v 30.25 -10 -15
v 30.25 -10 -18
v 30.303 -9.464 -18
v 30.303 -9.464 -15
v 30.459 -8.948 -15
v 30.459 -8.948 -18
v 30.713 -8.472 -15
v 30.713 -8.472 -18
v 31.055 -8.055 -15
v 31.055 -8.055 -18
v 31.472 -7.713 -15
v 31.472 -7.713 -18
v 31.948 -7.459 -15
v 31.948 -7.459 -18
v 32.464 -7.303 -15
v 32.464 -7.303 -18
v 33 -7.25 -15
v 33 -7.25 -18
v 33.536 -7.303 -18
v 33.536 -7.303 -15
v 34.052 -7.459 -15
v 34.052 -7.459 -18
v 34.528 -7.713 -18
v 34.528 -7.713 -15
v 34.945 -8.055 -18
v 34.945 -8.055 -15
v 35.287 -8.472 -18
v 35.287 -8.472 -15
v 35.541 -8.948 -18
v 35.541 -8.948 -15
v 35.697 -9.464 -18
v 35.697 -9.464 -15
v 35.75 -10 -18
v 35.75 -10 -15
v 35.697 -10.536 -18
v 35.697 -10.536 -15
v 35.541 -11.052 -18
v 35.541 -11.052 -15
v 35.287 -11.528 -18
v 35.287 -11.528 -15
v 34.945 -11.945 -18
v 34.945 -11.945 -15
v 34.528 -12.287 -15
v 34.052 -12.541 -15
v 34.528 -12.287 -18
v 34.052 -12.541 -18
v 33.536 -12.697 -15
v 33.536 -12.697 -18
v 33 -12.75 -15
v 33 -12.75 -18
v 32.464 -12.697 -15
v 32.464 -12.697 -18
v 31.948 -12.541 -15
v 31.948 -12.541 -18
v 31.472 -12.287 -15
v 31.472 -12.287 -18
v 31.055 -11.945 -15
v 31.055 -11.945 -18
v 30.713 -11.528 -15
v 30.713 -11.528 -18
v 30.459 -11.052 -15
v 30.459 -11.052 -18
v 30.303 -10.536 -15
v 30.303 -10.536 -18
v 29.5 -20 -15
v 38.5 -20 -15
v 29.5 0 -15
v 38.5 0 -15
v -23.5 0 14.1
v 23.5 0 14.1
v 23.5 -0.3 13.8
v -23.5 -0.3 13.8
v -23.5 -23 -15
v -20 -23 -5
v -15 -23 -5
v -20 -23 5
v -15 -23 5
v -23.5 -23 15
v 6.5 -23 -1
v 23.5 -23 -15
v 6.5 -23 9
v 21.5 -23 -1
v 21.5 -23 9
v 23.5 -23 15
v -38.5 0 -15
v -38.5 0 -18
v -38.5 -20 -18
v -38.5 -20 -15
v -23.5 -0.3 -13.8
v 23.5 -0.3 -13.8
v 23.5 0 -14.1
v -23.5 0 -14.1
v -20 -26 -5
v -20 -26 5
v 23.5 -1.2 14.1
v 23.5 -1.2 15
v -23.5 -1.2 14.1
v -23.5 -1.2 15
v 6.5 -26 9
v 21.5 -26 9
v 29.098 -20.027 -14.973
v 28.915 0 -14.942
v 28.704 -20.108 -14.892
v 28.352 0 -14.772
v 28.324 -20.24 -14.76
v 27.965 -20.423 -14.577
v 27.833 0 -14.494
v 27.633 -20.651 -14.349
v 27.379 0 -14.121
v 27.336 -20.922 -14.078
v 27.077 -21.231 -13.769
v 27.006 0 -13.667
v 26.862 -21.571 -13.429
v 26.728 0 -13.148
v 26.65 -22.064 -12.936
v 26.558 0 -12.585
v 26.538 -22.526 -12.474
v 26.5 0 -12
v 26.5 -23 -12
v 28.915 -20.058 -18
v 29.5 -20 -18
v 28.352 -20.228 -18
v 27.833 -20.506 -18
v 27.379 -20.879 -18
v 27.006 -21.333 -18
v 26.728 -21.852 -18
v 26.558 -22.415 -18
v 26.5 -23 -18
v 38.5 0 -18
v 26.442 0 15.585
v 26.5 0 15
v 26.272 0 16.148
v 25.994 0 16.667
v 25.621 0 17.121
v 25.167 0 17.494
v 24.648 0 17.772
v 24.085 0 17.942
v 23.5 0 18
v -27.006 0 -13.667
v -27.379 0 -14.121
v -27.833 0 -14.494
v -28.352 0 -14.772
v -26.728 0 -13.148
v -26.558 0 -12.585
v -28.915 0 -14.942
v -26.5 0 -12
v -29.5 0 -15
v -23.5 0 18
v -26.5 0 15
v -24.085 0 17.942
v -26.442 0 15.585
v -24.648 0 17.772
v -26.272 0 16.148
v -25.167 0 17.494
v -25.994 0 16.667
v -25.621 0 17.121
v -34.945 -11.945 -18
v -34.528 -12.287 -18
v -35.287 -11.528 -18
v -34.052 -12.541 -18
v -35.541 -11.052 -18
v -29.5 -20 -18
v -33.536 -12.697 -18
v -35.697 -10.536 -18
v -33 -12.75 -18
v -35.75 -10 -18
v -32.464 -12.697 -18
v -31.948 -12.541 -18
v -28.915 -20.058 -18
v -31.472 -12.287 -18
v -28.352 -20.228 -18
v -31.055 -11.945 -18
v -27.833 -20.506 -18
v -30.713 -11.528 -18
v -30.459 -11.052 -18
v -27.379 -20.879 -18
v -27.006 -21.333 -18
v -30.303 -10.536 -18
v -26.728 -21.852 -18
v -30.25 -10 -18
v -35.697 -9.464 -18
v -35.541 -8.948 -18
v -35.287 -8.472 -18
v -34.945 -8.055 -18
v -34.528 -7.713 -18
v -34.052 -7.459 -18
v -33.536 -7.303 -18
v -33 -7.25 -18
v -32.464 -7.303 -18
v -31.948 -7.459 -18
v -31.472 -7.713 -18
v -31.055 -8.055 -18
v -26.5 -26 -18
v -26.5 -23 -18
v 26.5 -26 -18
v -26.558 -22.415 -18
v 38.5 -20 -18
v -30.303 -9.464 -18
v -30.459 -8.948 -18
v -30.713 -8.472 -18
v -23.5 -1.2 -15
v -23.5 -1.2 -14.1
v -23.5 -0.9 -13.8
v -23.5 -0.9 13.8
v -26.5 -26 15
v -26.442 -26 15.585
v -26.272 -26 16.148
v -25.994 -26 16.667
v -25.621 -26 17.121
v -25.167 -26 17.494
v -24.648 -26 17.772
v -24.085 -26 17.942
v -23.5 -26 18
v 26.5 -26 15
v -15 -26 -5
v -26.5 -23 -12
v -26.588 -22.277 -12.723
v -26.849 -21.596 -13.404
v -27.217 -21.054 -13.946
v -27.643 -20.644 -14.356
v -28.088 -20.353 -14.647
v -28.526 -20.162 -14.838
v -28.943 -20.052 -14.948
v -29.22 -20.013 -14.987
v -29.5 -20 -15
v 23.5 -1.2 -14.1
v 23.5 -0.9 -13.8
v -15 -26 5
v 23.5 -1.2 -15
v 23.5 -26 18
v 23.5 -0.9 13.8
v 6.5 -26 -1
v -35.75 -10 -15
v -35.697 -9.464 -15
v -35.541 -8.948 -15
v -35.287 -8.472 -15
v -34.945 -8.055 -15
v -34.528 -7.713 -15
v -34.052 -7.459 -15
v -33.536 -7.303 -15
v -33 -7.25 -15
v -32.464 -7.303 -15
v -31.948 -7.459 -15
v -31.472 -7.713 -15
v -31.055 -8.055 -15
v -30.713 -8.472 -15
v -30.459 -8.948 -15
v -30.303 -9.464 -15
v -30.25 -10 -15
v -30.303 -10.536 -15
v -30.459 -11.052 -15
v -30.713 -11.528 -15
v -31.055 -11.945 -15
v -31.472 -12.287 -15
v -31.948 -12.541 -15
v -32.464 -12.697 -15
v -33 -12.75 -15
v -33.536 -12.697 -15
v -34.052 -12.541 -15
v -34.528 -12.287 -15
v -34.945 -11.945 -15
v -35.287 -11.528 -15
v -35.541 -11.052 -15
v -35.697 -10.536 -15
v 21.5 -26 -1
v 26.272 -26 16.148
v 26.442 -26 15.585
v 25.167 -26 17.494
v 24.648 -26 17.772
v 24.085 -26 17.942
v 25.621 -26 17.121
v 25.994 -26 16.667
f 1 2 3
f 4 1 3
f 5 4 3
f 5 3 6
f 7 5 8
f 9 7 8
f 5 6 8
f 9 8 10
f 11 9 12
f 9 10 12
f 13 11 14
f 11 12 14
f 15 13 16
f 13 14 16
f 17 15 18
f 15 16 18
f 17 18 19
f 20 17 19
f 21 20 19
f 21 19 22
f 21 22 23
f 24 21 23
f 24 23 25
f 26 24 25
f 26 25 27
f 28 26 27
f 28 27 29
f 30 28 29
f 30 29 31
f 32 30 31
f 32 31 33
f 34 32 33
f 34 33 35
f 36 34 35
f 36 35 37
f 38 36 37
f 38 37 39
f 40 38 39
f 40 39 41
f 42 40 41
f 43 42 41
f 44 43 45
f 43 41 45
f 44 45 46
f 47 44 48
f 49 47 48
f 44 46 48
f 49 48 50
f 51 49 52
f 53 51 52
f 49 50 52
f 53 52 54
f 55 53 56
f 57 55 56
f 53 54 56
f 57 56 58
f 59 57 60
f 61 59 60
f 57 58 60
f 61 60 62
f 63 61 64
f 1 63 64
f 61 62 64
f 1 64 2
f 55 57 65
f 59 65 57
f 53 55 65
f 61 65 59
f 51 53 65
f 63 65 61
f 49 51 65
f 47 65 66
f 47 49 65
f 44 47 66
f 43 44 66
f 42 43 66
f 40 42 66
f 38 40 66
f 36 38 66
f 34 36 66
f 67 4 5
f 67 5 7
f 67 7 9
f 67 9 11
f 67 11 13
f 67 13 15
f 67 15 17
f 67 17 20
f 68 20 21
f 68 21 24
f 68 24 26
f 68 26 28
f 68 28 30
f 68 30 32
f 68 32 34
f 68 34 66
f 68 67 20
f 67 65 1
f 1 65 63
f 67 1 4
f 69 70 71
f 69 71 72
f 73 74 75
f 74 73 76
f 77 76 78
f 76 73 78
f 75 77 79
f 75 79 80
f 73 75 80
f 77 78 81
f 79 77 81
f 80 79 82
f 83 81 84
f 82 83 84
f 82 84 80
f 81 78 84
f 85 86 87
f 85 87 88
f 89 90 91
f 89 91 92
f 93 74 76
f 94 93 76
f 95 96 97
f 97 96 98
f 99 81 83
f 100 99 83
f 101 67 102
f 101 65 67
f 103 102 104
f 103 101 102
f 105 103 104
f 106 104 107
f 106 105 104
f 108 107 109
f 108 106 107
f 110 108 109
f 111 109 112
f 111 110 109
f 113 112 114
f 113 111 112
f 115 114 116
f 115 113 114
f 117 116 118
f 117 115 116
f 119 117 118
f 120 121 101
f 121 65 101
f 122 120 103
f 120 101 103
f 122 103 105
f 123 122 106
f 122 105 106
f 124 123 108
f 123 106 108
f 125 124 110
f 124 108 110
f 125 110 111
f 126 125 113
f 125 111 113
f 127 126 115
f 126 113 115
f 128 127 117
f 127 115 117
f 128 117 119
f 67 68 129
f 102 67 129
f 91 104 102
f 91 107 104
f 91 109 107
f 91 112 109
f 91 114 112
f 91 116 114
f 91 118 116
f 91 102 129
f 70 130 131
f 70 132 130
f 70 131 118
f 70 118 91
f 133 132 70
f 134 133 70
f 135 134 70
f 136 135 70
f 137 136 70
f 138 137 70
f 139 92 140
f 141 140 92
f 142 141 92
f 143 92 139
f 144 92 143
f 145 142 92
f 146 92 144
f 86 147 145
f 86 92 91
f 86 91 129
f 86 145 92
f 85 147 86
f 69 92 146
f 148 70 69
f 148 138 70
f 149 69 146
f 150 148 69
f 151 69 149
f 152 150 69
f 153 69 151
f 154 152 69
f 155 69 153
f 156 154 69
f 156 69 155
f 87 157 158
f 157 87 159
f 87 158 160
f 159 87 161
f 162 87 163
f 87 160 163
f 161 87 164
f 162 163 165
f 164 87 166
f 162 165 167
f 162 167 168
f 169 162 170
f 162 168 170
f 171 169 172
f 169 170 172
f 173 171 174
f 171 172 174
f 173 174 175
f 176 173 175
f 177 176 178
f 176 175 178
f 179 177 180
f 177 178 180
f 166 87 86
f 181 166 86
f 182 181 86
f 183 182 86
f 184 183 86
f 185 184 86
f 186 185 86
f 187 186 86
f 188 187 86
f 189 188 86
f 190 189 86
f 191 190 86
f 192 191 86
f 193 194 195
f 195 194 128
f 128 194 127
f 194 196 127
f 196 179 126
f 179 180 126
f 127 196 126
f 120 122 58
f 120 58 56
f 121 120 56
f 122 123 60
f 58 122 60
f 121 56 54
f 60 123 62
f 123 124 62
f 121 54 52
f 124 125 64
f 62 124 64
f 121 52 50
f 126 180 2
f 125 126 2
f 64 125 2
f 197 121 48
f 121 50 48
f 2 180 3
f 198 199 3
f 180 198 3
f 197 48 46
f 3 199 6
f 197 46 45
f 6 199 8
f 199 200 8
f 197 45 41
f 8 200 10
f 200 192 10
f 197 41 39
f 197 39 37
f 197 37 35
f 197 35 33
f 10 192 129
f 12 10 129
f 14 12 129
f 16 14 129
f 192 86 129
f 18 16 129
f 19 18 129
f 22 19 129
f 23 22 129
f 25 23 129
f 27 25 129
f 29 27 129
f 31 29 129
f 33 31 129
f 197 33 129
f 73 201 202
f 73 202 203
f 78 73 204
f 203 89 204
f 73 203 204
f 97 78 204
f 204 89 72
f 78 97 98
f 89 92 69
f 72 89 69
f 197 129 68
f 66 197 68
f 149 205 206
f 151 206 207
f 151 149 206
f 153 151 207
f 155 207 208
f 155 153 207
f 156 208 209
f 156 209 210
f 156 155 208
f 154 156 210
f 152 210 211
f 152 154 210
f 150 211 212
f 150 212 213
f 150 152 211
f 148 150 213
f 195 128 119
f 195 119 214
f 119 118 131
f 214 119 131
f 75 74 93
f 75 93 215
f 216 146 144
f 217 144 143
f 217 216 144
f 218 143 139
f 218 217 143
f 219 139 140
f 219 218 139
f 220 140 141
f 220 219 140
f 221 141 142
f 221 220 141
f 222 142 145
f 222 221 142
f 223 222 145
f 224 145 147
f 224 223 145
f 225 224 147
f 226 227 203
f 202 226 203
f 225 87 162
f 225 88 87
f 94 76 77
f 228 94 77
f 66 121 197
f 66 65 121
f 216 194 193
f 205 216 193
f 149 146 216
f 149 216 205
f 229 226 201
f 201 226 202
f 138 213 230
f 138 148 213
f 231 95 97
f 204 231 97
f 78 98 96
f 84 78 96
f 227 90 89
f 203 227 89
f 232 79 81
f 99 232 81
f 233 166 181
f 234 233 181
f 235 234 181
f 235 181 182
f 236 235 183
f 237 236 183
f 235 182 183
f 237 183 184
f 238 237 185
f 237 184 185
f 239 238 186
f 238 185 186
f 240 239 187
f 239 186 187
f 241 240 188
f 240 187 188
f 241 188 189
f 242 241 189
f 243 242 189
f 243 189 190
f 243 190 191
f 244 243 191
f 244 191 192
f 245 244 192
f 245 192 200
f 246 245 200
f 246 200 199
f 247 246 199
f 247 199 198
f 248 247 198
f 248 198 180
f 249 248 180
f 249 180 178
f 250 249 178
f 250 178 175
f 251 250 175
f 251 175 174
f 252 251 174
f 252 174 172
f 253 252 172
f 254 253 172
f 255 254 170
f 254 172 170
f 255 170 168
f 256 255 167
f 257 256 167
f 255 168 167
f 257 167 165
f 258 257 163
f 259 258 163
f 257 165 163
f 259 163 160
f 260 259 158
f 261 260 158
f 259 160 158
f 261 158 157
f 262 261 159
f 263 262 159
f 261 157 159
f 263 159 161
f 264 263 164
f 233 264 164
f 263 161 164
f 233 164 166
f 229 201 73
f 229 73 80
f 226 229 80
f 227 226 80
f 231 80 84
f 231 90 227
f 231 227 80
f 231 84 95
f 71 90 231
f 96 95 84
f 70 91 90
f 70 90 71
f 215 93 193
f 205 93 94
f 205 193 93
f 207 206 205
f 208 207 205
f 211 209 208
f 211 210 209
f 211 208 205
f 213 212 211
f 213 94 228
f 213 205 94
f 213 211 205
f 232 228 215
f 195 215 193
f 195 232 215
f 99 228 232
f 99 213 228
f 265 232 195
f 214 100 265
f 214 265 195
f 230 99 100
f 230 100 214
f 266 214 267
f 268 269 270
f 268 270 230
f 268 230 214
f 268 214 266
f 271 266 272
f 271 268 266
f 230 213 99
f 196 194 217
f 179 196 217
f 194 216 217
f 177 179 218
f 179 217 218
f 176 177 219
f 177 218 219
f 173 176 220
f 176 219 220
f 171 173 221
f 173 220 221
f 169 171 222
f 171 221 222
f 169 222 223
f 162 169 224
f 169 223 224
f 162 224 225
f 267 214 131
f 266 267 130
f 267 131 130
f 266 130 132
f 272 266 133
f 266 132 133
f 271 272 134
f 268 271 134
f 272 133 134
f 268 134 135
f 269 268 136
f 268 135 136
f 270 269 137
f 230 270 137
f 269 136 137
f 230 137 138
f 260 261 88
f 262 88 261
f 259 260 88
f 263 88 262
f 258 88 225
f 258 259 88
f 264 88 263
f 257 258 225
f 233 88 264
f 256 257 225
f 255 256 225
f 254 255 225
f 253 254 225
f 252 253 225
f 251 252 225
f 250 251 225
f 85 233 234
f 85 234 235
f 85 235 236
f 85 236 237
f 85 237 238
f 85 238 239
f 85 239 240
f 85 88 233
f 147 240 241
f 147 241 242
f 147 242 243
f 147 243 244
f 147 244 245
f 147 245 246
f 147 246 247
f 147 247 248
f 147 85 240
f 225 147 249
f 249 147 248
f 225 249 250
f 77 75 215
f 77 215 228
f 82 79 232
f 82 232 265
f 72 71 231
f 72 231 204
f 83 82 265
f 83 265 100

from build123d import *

# Parameters (mm, degrees)
F0_W       = 47
F0_H       = 30
F1_DEPTH   = 23
F0_W_2     = 12
F0_H_2     = 3
F2_DEPTH   = 20
F3_W       = 47
F3_H       = 1.2
F4_DEPTH   = 1.2
F5_SIZE    = 0.3
F8_D       = 5.5
F8_ON_F7_D = 5.5
F9_W       = 53
F9_H       = 36
F9_W_2     = 5
F9_H_2     = 10
F9_W_3     = 15
F10_DEPTH  = 3
F11_R      = 3


with BuildPart() as f1:
    # F0 (on Front) → F1 (new body)
    with BuildSketch(Plane.XZ):
        Polygon((-26.5, -18), (26.5, -18), (26.5, -15), (26.5, 18), (-26.5, 18), (-26.5, -15), align=None)
        Rectangle(F0_W, F0_H, mode=Mode.SUBTRACT)
    extrude(amount=F1_DEPTH)

    # F0 (on Front) → F2 (join)
    with BuildSketch(Plane.XZ):
        with Locations((-32.5, -16.5)):
            Rectangle(F0_W_2, F0_H_2)
        with Locations((32.5, -16.5)):
            Rectangle(F0_W_2, F0_H_2)
    extrude(amount=F2_DEPTH)

    # F3 (on face) → F4 (join)
    with BuildSketch(Plane(origin=(0, 0, 0), x_dir=(-1, 0, 0), z_dir=(0, 1, 0))):
        with Locations((0, 14.4)):
            Rectangle(F3_W, F3_H)
        with Locations((0, -14.4)):
            Rectangle(F3_W, F3_H)
    extrude(amount=-F4_DEPTH)

    # F5
    f5_edges = [f1.edges().sort_by_distance(p)[0] for p in [
        (0, 0, -13.8),
        (0, -1.2, -13.8),
        (0, 0, 13.8),
        (0, -1.2, 13.8),
    ]]
    chamfer(f5_edges, length=F5_SIZE)

    # F8 (through all)
    with Locations(Plane.XY.offset(-15)):
        with Locations((-33, -10)):
            Hole(F8_D / 2)

    # F8 on F7 (through all)
    with Locations(Plane.XY.offset(-15)):
        with Locations((33, -10)):
            Hole(F8_ON_F7_D / 2)

    # F9 (on face) → F10 (join)
    with BuildSketch(Plane.XZ.offset(23)):
        Rectangle(F9_W, F9_H)
        with Locations((-17.5, 0)):
            Rectangle(F9_W_2, F9_H_2, mode=Mode.SUBTRACT)
        with Locations((14, 4)):
            Rectangle(F9_W_3, F9_H_2, mode=Mode.SUBTRACT)
    extrude(amount=F10_DEPTH)

    # F11
    f11_edges = [f1.edges().sort_by_distance(p)[0] for p in [
        (-26.5, -10, -15),
        (-26.5, -13, 18),
        (26.5, -13, 18),
        (26.5, -10, -15),
        (26.5, -20, -16.5),
        (-26.5, -20, -16.5),
    ]]
    fillet(f11_edges, radius=F11_R)


solid = f1.part
